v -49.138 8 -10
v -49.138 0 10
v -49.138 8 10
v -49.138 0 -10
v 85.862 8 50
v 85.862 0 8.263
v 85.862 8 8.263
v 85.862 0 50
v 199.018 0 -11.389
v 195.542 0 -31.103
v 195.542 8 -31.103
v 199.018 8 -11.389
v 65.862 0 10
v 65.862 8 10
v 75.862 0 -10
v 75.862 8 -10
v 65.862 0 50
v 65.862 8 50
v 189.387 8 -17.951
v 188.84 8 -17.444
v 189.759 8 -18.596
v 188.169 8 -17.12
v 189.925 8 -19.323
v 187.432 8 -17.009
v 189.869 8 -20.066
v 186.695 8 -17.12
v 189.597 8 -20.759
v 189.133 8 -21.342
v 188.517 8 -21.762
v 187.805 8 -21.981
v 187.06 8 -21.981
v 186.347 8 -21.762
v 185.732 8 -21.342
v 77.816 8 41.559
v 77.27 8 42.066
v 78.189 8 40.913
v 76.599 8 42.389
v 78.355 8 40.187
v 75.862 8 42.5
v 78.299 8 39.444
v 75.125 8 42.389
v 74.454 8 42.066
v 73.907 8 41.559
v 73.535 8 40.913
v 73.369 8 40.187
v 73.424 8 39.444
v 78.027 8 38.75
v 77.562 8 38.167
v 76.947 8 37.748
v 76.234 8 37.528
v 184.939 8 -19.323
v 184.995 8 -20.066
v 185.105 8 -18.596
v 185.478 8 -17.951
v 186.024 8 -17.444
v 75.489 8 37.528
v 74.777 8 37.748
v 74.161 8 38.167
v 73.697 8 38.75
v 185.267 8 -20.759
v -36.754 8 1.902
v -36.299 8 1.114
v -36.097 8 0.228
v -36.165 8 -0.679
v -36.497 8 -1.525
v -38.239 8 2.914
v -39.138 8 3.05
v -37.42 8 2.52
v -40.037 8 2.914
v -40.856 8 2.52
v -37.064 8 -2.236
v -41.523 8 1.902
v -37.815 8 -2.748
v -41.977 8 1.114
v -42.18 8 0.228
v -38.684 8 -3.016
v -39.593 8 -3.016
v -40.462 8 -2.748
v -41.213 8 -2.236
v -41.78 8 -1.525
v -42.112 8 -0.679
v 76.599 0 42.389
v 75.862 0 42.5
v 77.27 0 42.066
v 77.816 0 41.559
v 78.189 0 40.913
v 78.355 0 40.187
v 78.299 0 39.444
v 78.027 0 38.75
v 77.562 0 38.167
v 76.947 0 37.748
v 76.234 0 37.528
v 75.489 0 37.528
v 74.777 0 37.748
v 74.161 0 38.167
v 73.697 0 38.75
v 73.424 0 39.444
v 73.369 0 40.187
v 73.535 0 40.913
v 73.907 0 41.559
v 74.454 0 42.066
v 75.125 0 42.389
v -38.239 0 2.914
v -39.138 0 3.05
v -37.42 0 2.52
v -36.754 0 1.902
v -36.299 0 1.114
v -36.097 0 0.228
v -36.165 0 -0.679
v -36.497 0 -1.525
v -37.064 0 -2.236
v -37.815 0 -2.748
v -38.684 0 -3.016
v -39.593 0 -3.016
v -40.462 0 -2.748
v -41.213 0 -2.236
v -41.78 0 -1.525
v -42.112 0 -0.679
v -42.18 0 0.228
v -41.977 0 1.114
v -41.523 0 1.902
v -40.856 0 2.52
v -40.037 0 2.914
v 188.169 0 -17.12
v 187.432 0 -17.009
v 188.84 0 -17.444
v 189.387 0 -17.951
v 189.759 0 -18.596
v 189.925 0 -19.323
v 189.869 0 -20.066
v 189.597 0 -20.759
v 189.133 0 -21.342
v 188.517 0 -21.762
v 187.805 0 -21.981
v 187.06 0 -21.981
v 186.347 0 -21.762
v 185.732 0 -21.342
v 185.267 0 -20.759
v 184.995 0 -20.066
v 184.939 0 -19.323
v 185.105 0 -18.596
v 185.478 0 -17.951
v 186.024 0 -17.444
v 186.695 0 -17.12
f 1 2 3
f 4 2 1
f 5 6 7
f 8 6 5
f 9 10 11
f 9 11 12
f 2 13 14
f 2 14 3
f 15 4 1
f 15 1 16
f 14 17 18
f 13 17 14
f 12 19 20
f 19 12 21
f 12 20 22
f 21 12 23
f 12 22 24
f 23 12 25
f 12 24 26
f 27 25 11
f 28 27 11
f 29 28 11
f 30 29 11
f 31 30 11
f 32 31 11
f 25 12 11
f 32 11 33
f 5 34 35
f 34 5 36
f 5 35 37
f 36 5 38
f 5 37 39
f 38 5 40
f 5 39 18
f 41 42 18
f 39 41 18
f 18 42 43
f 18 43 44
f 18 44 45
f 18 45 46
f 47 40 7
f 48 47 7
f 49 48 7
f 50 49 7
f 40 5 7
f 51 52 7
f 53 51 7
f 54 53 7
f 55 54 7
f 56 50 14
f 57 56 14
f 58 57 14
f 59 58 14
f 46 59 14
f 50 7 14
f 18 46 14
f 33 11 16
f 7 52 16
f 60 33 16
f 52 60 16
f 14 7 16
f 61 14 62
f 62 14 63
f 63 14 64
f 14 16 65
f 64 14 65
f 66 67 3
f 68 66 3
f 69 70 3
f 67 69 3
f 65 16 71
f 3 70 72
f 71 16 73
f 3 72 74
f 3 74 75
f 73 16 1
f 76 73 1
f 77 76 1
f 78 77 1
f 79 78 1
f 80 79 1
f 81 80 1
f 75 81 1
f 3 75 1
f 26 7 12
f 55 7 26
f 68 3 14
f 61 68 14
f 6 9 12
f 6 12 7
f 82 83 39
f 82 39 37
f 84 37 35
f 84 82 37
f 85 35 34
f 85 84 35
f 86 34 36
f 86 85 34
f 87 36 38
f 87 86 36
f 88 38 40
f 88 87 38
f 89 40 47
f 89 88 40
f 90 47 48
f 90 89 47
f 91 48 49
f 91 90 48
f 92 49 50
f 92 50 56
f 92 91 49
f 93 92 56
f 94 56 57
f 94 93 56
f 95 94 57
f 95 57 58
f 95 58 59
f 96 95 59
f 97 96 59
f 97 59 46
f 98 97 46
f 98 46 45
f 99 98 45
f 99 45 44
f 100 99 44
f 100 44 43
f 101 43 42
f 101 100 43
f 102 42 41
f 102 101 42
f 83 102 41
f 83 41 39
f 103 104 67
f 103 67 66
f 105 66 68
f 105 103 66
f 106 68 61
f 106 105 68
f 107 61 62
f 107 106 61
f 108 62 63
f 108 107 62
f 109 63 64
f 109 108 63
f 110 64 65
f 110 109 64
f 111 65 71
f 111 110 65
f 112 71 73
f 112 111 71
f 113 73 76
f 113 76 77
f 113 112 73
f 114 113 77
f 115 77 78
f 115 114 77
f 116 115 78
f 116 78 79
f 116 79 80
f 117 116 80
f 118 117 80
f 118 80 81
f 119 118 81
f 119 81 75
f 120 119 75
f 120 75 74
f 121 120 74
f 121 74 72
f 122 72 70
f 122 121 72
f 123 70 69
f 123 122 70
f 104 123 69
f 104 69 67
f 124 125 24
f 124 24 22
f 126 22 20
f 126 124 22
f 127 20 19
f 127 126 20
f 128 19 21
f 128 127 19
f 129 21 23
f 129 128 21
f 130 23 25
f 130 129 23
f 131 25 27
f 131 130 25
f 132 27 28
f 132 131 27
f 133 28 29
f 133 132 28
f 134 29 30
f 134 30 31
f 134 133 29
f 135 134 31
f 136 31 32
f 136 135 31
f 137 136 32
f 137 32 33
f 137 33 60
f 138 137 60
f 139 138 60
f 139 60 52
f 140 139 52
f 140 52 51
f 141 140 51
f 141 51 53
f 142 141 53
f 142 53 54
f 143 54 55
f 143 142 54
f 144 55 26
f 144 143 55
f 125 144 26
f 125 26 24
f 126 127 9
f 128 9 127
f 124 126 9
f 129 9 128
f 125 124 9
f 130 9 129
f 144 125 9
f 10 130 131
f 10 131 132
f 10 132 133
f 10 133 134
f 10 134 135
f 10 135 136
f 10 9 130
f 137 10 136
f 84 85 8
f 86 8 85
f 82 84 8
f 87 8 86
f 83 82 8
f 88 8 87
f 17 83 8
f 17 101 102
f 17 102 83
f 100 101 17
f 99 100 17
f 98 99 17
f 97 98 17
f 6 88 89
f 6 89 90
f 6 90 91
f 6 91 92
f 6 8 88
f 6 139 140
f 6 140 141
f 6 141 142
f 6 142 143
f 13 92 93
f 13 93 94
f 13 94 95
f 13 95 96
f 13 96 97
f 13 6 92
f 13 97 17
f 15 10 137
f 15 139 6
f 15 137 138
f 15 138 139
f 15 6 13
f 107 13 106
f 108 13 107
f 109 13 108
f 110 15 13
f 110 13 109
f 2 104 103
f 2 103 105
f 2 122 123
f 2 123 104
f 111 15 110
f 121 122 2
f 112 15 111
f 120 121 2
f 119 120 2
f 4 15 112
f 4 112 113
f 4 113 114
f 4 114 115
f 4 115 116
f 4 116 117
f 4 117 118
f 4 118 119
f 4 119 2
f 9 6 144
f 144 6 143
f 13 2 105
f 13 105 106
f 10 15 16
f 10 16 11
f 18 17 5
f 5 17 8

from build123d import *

# Parameters (mm, degrees)
SKETCH1_R           = 3.05
SKETCH1_R_2         = 2.5
BOSS_EXTRUDE1_DEPTH = 8


with BuildPart() as part:
    # Sketch1 → Boss-Extrude1 (new body)
    with BuildSketch(Plane(origin=(0, 0, 0), x_dir=(1, 0, 0), z_dir=(0, 1, 0))):
        Polygon((75.861805451, 10), (195.542164518, 31.102876365), (199.018293649, 11.388768424), (85.861805451, -8.263285294), (85.861805451, -50), (75.861805451, -50), (65.861805451, -50), (65.861805451, -10), (-49.138194549, -10), (-49.138194549, 10), align=None)
        with Locations(Location((-39.138194549, 0, 0), (0, 0, 270))):
            Circle(SKETCH1_R, mode=Mode.SUBTRACT)
        with Locations(Location((75.861805451, -40, 0), (0, 0, 270))):
            Circle(SKETCH1_R_2, mode=Mode.SUBTRACT)
        with Locations(Location((187.432151553, 19.509340618, 0), (0, 0, 270))):
            Circle(SKETCH1_R_2, mode=Mode.SUBTRACT)
    extrude(amount=BOSS_EXTRUDE1_DEPTH)


solid = part.part
